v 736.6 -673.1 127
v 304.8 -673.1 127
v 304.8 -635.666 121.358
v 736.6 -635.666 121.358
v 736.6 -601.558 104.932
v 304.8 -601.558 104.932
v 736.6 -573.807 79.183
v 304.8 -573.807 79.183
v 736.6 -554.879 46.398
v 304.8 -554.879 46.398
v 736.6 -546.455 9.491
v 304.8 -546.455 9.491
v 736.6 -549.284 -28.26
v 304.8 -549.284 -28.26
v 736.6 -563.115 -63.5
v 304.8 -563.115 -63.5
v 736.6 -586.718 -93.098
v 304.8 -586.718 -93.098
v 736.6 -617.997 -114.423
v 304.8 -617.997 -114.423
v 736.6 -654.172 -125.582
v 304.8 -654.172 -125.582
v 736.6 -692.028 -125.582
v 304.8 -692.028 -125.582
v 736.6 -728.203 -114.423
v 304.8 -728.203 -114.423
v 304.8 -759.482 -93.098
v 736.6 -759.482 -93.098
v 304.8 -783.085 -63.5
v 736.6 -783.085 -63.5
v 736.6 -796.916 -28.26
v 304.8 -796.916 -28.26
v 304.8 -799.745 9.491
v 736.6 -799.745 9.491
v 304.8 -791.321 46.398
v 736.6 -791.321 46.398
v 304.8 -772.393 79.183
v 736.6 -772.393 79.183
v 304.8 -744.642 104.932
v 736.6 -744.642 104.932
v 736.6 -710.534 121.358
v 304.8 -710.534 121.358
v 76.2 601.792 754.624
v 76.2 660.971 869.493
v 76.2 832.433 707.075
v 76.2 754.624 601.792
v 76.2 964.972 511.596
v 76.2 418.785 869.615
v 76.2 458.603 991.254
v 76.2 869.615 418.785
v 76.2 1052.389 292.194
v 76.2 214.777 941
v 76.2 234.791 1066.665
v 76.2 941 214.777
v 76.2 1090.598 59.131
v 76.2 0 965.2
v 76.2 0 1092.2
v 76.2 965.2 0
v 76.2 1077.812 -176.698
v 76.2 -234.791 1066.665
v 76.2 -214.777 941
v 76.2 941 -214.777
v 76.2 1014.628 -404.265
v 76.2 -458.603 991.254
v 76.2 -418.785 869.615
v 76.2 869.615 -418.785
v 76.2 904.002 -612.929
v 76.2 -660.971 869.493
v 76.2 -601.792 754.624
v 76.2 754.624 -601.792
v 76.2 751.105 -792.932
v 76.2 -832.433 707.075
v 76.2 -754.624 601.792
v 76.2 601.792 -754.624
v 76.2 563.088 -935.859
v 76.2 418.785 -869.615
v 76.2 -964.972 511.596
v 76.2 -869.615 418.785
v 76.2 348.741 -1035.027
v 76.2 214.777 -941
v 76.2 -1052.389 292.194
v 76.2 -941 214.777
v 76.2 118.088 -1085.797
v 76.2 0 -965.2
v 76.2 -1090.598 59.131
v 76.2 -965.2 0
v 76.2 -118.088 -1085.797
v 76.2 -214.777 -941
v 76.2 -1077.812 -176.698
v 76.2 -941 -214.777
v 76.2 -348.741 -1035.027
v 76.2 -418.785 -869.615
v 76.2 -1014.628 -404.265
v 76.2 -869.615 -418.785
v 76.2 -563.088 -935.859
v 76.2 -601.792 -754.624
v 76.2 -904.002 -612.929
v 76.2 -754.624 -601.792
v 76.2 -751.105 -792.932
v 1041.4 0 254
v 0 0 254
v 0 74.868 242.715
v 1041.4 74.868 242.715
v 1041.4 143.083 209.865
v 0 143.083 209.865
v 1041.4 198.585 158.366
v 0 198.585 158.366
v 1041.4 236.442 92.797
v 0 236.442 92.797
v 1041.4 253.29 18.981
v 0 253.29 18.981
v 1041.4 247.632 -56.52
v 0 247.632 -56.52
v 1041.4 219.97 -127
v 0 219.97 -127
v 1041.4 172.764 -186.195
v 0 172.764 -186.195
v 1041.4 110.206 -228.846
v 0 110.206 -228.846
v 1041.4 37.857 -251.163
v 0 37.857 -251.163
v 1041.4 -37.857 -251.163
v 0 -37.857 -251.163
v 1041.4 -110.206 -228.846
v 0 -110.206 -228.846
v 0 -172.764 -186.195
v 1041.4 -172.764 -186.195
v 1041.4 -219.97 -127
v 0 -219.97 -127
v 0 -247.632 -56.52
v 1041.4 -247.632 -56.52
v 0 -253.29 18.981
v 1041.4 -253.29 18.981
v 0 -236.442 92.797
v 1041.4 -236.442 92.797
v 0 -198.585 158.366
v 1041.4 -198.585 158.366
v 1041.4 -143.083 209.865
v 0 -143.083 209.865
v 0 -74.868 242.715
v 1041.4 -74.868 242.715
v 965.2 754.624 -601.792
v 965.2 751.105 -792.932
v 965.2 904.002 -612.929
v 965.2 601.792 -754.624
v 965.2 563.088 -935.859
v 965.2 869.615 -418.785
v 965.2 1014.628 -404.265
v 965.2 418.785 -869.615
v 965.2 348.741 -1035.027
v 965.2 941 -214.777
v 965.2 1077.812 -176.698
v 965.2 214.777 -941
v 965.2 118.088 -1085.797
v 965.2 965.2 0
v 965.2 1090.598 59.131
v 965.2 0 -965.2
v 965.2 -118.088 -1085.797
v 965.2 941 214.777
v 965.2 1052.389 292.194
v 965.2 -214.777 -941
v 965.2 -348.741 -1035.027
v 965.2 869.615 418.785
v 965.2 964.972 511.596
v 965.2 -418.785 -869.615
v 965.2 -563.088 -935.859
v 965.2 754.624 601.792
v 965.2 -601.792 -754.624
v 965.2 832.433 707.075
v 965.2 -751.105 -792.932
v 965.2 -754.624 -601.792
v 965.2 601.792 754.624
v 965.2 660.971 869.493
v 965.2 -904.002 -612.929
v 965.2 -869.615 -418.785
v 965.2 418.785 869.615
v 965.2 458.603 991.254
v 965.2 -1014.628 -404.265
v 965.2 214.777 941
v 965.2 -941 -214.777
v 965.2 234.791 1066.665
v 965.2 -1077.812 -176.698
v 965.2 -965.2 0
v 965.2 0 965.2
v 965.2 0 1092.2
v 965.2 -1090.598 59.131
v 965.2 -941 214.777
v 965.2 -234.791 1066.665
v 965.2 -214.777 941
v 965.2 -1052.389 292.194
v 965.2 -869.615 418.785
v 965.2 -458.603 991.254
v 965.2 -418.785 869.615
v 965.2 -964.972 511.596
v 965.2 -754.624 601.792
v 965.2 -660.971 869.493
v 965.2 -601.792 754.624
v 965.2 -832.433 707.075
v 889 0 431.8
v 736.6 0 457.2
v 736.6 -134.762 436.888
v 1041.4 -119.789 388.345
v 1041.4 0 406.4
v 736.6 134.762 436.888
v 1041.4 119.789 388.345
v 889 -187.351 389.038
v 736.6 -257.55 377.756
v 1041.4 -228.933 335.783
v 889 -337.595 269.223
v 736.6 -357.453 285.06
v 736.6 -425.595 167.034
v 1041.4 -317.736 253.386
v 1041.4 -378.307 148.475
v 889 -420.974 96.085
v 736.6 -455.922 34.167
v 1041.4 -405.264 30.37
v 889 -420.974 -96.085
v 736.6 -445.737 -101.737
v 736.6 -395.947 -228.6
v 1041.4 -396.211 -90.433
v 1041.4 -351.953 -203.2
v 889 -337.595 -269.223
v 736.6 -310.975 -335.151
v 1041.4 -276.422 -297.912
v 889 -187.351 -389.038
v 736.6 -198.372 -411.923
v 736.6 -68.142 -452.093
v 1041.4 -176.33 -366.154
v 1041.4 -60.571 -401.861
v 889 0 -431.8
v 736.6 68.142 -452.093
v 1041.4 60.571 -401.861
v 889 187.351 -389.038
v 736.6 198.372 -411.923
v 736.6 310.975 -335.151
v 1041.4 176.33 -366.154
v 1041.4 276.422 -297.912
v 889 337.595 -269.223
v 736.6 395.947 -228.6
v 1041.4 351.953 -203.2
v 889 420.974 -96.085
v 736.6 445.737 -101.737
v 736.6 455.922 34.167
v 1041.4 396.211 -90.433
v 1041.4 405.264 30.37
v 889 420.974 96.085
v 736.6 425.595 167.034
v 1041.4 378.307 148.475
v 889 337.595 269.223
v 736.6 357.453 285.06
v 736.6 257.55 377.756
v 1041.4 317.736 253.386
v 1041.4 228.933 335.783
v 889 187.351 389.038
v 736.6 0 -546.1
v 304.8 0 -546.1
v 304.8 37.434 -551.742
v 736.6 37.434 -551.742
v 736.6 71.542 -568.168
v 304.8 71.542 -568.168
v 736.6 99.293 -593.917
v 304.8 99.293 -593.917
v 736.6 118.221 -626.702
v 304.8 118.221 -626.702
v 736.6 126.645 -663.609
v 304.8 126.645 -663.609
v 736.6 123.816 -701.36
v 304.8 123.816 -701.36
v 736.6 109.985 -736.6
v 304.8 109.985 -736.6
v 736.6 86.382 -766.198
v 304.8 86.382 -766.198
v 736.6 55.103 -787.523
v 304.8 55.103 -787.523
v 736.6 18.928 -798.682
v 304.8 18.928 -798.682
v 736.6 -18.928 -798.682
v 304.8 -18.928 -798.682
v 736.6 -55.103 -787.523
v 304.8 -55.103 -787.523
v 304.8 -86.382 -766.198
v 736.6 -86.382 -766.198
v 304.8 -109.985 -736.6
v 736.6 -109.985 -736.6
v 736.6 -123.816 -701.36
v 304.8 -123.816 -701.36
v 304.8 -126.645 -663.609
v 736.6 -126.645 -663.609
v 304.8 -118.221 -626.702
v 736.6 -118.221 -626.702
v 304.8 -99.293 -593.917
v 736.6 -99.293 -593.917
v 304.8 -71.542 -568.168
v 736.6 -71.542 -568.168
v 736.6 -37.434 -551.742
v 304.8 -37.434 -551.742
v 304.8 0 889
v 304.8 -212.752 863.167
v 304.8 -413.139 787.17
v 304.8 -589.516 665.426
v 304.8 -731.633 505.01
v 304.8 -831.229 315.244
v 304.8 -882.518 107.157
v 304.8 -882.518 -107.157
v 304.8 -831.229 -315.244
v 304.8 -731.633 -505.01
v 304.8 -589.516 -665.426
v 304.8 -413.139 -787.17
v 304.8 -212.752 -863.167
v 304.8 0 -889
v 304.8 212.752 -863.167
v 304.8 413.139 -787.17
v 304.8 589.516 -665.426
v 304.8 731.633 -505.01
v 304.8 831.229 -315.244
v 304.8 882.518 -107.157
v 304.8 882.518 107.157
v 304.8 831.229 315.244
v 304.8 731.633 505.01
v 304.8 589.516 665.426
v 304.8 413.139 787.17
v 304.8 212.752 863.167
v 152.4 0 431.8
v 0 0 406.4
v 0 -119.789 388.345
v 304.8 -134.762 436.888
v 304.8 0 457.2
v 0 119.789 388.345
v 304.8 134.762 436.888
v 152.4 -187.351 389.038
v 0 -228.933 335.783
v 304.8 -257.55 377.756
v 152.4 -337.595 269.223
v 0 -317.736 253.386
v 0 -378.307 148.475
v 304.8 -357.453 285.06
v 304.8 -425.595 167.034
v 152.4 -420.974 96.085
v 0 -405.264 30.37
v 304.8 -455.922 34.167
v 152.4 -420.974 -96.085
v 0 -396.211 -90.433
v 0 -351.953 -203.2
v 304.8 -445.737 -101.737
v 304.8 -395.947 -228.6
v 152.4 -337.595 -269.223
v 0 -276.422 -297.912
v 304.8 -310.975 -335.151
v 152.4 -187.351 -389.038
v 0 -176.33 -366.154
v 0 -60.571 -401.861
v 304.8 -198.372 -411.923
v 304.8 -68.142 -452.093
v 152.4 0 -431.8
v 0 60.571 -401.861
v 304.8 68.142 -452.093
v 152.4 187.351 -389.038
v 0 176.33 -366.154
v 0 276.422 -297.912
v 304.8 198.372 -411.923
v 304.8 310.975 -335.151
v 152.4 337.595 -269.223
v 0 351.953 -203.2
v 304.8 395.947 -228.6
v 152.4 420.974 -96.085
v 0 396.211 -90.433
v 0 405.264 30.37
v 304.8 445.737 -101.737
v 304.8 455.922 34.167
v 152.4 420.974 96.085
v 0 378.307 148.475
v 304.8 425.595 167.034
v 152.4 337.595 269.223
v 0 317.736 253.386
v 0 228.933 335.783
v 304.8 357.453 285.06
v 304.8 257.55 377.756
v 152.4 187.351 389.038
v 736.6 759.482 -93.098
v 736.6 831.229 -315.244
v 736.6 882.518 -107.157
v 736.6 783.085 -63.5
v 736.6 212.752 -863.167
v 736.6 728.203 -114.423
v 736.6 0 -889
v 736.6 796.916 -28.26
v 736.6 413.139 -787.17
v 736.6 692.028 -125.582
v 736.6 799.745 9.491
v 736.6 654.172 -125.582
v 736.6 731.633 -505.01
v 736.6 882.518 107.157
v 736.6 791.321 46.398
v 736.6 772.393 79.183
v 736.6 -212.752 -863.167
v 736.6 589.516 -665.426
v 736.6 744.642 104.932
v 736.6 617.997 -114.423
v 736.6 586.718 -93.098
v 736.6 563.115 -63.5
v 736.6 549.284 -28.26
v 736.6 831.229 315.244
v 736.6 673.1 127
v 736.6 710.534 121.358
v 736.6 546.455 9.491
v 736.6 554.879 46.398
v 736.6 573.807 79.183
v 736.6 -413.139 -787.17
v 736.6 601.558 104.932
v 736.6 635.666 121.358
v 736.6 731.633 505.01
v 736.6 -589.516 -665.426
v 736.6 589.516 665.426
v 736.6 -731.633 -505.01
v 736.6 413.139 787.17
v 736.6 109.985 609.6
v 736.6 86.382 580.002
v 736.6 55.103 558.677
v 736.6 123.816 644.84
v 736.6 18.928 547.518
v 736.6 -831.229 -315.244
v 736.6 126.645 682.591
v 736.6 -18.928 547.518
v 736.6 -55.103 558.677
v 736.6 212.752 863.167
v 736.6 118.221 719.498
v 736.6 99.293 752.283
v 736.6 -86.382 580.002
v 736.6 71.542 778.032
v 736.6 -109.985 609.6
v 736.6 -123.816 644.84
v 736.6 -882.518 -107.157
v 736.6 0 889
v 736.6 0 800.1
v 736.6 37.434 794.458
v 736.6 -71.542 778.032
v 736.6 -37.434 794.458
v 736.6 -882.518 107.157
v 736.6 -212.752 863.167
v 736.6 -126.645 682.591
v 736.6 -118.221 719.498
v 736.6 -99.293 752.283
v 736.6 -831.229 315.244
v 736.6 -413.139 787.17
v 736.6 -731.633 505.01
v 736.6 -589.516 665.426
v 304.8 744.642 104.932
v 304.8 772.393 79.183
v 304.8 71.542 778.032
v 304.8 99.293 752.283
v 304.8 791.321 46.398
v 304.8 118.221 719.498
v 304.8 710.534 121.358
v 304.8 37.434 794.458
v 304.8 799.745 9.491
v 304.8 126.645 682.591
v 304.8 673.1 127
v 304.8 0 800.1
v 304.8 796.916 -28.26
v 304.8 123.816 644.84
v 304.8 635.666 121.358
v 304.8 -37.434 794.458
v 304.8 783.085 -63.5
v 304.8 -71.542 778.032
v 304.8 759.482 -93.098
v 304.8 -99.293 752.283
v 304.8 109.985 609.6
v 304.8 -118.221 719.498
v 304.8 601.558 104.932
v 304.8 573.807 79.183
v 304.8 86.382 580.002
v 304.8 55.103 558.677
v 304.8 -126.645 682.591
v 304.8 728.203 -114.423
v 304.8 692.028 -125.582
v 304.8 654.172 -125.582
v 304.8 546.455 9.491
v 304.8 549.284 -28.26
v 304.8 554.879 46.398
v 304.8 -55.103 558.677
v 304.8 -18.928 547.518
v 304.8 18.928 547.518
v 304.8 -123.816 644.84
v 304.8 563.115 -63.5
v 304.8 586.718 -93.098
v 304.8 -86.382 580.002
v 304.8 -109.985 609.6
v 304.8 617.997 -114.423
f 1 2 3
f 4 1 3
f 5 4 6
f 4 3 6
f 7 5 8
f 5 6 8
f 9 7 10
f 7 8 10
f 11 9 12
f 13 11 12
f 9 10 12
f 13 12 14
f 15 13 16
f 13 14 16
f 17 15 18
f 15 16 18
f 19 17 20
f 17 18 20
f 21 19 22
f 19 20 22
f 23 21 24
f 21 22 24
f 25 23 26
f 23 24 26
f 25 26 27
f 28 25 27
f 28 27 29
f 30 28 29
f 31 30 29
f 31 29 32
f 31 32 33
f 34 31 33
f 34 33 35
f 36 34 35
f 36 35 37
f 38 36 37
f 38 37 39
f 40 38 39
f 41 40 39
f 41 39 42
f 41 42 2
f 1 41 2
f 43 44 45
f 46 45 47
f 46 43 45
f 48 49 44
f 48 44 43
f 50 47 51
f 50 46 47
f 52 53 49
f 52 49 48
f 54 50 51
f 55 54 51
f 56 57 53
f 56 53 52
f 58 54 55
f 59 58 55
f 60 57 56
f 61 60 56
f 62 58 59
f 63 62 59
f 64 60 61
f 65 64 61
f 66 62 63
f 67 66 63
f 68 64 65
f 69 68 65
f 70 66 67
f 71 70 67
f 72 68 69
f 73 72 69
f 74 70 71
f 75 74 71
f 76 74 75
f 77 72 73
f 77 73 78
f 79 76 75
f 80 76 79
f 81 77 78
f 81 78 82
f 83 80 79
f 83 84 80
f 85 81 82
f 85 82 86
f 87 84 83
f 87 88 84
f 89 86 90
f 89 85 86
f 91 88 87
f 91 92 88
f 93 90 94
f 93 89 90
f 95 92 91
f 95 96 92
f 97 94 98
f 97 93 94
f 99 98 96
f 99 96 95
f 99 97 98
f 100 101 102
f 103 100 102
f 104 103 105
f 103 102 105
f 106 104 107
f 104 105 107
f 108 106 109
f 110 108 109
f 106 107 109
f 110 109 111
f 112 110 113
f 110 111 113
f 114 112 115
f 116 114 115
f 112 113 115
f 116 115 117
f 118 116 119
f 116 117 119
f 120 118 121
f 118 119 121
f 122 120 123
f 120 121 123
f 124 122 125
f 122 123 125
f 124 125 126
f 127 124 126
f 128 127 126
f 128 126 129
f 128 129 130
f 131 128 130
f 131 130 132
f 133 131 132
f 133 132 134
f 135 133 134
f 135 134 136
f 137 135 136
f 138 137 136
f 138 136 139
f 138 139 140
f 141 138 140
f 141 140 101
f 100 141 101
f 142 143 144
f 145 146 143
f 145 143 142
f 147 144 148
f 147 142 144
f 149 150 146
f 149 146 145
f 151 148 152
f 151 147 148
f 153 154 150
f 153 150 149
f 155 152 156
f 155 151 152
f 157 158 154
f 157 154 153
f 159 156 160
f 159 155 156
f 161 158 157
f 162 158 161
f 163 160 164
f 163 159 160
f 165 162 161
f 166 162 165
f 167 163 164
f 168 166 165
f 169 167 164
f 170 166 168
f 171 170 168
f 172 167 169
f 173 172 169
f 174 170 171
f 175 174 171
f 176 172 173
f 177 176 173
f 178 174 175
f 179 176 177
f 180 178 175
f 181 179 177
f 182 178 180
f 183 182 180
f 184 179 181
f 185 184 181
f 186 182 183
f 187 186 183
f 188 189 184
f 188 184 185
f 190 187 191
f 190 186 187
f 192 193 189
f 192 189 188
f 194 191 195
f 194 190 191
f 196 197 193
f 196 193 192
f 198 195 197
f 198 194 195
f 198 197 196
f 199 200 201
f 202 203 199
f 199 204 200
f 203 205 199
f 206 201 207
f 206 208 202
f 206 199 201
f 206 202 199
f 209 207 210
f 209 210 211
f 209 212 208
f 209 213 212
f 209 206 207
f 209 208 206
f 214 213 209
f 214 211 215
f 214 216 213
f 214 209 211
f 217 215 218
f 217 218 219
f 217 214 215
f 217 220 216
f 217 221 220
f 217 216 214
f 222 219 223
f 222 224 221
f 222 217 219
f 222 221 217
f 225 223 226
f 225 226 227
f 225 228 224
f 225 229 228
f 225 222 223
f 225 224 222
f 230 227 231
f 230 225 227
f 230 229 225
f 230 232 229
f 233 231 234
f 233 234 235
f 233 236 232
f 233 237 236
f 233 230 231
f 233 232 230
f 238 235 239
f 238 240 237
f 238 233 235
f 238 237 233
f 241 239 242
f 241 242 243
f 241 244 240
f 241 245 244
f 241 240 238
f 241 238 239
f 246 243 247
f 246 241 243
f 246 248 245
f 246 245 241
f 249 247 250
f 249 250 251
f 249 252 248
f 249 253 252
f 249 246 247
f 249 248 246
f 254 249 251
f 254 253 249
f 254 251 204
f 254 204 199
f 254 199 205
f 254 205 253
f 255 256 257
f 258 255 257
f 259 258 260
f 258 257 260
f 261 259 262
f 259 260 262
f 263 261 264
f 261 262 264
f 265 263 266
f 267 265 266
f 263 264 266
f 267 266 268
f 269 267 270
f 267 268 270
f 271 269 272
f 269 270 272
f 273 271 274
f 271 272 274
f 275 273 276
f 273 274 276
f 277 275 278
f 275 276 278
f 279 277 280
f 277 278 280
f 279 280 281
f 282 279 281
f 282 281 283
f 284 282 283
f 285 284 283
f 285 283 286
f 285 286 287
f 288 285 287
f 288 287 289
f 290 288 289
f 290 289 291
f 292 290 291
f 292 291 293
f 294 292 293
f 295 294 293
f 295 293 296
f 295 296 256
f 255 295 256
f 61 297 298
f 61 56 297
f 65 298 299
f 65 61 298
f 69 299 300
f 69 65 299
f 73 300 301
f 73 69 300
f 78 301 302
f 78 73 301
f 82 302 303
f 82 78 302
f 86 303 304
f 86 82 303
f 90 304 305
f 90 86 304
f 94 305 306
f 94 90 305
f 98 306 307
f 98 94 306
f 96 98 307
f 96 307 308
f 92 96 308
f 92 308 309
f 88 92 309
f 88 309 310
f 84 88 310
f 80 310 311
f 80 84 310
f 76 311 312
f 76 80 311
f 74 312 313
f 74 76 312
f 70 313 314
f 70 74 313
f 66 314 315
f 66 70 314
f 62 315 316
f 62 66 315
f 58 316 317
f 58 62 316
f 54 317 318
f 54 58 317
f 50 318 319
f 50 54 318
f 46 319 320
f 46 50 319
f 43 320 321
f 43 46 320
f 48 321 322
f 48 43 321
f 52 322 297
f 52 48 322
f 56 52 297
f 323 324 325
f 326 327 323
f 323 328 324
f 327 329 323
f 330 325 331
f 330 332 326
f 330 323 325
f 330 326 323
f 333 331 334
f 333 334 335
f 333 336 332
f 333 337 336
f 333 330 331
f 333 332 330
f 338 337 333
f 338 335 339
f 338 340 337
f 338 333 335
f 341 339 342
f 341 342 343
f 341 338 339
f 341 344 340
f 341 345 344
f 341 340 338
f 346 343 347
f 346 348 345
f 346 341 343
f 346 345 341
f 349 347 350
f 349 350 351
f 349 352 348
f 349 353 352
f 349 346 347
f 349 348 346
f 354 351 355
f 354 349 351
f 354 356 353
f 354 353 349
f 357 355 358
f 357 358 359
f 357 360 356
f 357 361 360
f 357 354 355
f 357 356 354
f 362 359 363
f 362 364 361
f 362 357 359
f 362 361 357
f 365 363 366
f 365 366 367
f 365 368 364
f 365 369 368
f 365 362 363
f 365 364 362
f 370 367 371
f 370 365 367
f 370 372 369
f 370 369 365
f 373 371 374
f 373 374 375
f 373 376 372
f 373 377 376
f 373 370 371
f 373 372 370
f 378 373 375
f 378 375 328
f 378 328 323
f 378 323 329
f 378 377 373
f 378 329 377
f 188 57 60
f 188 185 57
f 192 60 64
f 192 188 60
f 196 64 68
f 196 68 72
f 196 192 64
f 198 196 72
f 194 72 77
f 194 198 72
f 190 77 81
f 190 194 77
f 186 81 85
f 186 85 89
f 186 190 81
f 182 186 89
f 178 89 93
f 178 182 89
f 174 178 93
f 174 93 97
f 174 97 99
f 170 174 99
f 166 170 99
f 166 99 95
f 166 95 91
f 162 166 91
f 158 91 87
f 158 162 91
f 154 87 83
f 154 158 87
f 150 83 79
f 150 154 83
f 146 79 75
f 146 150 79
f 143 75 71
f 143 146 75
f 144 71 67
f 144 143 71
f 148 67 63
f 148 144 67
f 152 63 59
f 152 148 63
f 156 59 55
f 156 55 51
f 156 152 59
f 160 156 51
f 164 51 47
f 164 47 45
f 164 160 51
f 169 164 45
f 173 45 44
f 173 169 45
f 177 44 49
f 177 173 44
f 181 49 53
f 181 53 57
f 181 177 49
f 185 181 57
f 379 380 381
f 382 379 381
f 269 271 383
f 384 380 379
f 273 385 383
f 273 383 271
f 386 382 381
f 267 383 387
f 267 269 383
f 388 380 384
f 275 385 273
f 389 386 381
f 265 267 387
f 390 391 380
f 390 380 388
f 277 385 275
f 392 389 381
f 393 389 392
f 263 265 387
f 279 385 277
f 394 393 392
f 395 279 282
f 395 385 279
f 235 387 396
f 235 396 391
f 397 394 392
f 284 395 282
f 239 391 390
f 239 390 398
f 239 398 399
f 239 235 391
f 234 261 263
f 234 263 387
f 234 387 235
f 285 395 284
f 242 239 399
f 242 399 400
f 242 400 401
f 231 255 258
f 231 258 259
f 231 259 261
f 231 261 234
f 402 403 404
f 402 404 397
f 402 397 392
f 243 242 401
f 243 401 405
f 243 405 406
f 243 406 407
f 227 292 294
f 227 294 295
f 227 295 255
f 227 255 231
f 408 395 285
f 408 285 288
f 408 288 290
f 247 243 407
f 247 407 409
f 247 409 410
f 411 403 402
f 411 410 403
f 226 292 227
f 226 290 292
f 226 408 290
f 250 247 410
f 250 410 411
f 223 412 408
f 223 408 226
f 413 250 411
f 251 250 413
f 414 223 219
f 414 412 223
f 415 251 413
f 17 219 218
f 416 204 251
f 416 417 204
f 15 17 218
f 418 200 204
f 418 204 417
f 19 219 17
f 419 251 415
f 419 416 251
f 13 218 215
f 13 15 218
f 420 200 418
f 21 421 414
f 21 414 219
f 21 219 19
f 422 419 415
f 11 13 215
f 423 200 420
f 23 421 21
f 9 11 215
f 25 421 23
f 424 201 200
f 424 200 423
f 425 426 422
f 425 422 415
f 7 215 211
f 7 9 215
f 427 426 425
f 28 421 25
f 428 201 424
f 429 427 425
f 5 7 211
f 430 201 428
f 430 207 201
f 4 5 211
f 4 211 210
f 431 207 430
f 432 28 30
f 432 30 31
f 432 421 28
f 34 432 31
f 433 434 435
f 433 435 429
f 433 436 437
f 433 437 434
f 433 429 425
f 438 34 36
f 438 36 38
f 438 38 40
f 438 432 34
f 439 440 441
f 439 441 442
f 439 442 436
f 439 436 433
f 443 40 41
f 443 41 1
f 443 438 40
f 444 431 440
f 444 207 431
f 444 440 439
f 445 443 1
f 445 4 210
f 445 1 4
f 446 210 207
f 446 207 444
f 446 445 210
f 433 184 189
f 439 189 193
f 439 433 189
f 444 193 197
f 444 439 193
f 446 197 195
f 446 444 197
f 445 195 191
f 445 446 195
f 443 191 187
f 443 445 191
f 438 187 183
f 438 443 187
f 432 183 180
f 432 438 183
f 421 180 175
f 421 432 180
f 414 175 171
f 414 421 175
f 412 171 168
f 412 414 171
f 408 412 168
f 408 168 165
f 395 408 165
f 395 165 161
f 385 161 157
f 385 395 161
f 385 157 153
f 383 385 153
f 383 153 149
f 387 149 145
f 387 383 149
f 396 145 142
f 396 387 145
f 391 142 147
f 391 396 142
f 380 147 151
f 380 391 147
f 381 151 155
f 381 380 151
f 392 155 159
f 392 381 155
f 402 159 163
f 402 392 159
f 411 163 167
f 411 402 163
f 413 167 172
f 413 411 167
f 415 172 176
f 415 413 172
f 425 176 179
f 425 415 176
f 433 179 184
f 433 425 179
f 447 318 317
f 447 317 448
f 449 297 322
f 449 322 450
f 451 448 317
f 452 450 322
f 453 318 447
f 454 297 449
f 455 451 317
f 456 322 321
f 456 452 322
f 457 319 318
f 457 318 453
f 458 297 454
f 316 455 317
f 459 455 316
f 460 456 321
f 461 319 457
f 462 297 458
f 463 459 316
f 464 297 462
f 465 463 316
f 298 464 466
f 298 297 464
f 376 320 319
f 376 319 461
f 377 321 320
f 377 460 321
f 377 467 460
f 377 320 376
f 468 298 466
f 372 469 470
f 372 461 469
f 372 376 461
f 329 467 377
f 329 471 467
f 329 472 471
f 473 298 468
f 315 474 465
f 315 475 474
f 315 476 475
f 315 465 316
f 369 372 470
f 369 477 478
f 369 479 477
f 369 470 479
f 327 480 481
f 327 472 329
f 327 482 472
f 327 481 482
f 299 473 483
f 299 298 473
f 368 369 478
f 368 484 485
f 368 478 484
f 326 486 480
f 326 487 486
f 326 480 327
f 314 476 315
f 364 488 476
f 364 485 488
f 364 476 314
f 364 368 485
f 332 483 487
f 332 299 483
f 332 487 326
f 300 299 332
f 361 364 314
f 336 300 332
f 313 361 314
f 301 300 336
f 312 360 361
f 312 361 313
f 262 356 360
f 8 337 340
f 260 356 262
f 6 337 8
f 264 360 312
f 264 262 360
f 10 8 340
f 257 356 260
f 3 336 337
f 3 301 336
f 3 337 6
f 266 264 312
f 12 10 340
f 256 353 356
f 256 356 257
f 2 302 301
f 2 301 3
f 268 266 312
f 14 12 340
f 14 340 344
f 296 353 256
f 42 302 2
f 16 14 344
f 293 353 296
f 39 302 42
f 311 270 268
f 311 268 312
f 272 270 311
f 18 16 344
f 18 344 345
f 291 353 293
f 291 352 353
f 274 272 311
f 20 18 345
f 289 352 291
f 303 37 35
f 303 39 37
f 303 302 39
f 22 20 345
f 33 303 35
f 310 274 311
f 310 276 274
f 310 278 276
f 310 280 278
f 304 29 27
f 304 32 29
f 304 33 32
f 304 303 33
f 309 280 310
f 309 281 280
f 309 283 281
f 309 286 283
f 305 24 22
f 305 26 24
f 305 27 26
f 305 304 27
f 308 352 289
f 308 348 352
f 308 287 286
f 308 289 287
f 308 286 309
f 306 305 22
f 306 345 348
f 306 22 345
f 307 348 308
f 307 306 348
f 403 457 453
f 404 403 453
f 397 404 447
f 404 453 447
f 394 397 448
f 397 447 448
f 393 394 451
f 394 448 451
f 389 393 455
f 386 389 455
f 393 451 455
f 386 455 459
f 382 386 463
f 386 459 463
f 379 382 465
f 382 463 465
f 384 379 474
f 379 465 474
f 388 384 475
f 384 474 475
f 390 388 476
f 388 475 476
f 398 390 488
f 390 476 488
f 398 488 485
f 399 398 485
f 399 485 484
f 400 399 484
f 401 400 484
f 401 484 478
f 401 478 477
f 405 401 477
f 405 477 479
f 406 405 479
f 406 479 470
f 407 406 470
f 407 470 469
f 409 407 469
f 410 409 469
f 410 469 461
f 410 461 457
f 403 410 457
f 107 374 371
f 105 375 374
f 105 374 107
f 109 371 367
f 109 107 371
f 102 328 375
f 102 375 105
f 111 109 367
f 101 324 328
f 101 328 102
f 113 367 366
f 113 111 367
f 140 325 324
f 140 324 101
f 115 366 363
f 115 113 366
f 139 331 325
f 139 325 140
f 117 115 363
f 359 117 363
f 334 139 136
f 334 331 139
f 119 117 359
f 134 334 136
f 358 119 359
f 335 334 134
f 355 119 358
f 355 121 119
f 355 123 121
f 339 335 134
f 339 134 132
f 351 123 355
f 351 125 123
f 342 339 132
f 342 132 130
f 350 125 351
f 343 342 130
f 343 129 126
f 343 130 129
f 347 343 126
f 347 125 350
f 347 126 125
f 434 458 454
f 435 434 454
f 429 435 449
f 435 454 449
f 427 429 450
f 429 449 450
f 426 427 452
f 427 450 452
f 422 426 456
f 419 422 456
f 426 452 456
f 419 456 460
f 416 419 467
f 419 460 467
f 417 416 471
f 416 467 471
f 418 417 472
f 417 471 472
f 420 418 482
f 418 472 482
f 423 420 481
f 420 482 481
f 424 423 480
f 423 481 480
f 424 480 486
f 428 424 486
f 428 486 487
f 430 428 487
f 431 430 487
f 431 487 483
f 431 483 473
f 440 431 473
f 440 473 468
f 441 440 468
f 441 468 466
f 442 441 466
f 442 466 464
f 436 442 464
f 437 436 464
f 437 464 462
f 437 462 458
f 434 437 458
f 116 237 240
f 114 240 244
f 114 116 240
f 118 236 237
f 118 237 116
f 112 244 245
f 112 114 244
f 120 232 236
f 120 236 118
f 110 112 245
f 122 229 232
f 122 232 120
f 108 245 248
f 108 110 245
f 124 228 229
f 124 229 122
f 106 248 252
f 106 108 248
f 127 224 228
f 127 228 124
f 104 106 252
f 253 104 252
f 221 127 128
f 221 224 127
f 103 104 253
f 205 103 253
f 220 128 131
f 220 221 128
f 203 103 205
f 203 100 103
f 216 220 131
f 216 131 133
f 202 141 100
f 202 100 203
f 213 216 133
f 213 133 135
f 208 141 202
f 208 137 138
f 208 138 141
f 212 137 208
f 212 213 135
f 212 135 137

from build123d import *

# Parameters (mm, degrees)
SKETCH5_R          = 127
CUT_EXTRUDE1_DEPTH = 1863.878321308
SKETCH6_R          = 254
CUT_EXTRUDE2_DEPTH = 1863.878321308


with BuildPart() as part:
    # Sketch2 → Revolve2 (revolve)
    with BuildSketch(Plane(origin=(0, 0, 0), x_dir=(1, 0, 0), z_dir=(0, 1, 0)), mode=Mode.PRIVATE) as revolve2_sk:
        Polygon((0, 0), (0, 406.4), (304.8, 457.2), (304.8, 889), (76.2, 965.2), (76.2, 1092.2), (965.2, 1092.2), (965.2, 965.2), (736.6, 889), (736.6, 457.2), (1041.4, 406.4), (1041.4, 0), align=None)
    revolve(revolve2_sk.sketch.rotate(Axis((0, 0, 0), (1, 0, 0)), 180), axis=Axis((0, 0, 0), (1, 0, 0)))

    # Sketch5 → Cut-Extrude1 (cut, through all)
    with BuildSketch(Plane.ZY):
        with Locations((0, 673.1)):
            Circle(SKETCH5_R)
        with Locations((673.1, 0)):
            Circle(SKETCH5_R)
        with Locations((0, -673.1)):
            Circle(SKETCH5_R)
        with Locations((-673.1, 0)):
            Circle(SKETCH5_R)
    extrude(amount=-CUT_EXTRUDE1_DEPTH, mode=Mode.SUBTRACT)

    # Sketch6 → Cut-Extrude2 (cut, through all)
    with BuildSketch(Plane.ZY):
        Circle(SKETCH6_R)
    extrude(amount=-CUT_EXTRUDE2_DEPTH, mode=Mode.SUBTRACT)


solid = part.part
